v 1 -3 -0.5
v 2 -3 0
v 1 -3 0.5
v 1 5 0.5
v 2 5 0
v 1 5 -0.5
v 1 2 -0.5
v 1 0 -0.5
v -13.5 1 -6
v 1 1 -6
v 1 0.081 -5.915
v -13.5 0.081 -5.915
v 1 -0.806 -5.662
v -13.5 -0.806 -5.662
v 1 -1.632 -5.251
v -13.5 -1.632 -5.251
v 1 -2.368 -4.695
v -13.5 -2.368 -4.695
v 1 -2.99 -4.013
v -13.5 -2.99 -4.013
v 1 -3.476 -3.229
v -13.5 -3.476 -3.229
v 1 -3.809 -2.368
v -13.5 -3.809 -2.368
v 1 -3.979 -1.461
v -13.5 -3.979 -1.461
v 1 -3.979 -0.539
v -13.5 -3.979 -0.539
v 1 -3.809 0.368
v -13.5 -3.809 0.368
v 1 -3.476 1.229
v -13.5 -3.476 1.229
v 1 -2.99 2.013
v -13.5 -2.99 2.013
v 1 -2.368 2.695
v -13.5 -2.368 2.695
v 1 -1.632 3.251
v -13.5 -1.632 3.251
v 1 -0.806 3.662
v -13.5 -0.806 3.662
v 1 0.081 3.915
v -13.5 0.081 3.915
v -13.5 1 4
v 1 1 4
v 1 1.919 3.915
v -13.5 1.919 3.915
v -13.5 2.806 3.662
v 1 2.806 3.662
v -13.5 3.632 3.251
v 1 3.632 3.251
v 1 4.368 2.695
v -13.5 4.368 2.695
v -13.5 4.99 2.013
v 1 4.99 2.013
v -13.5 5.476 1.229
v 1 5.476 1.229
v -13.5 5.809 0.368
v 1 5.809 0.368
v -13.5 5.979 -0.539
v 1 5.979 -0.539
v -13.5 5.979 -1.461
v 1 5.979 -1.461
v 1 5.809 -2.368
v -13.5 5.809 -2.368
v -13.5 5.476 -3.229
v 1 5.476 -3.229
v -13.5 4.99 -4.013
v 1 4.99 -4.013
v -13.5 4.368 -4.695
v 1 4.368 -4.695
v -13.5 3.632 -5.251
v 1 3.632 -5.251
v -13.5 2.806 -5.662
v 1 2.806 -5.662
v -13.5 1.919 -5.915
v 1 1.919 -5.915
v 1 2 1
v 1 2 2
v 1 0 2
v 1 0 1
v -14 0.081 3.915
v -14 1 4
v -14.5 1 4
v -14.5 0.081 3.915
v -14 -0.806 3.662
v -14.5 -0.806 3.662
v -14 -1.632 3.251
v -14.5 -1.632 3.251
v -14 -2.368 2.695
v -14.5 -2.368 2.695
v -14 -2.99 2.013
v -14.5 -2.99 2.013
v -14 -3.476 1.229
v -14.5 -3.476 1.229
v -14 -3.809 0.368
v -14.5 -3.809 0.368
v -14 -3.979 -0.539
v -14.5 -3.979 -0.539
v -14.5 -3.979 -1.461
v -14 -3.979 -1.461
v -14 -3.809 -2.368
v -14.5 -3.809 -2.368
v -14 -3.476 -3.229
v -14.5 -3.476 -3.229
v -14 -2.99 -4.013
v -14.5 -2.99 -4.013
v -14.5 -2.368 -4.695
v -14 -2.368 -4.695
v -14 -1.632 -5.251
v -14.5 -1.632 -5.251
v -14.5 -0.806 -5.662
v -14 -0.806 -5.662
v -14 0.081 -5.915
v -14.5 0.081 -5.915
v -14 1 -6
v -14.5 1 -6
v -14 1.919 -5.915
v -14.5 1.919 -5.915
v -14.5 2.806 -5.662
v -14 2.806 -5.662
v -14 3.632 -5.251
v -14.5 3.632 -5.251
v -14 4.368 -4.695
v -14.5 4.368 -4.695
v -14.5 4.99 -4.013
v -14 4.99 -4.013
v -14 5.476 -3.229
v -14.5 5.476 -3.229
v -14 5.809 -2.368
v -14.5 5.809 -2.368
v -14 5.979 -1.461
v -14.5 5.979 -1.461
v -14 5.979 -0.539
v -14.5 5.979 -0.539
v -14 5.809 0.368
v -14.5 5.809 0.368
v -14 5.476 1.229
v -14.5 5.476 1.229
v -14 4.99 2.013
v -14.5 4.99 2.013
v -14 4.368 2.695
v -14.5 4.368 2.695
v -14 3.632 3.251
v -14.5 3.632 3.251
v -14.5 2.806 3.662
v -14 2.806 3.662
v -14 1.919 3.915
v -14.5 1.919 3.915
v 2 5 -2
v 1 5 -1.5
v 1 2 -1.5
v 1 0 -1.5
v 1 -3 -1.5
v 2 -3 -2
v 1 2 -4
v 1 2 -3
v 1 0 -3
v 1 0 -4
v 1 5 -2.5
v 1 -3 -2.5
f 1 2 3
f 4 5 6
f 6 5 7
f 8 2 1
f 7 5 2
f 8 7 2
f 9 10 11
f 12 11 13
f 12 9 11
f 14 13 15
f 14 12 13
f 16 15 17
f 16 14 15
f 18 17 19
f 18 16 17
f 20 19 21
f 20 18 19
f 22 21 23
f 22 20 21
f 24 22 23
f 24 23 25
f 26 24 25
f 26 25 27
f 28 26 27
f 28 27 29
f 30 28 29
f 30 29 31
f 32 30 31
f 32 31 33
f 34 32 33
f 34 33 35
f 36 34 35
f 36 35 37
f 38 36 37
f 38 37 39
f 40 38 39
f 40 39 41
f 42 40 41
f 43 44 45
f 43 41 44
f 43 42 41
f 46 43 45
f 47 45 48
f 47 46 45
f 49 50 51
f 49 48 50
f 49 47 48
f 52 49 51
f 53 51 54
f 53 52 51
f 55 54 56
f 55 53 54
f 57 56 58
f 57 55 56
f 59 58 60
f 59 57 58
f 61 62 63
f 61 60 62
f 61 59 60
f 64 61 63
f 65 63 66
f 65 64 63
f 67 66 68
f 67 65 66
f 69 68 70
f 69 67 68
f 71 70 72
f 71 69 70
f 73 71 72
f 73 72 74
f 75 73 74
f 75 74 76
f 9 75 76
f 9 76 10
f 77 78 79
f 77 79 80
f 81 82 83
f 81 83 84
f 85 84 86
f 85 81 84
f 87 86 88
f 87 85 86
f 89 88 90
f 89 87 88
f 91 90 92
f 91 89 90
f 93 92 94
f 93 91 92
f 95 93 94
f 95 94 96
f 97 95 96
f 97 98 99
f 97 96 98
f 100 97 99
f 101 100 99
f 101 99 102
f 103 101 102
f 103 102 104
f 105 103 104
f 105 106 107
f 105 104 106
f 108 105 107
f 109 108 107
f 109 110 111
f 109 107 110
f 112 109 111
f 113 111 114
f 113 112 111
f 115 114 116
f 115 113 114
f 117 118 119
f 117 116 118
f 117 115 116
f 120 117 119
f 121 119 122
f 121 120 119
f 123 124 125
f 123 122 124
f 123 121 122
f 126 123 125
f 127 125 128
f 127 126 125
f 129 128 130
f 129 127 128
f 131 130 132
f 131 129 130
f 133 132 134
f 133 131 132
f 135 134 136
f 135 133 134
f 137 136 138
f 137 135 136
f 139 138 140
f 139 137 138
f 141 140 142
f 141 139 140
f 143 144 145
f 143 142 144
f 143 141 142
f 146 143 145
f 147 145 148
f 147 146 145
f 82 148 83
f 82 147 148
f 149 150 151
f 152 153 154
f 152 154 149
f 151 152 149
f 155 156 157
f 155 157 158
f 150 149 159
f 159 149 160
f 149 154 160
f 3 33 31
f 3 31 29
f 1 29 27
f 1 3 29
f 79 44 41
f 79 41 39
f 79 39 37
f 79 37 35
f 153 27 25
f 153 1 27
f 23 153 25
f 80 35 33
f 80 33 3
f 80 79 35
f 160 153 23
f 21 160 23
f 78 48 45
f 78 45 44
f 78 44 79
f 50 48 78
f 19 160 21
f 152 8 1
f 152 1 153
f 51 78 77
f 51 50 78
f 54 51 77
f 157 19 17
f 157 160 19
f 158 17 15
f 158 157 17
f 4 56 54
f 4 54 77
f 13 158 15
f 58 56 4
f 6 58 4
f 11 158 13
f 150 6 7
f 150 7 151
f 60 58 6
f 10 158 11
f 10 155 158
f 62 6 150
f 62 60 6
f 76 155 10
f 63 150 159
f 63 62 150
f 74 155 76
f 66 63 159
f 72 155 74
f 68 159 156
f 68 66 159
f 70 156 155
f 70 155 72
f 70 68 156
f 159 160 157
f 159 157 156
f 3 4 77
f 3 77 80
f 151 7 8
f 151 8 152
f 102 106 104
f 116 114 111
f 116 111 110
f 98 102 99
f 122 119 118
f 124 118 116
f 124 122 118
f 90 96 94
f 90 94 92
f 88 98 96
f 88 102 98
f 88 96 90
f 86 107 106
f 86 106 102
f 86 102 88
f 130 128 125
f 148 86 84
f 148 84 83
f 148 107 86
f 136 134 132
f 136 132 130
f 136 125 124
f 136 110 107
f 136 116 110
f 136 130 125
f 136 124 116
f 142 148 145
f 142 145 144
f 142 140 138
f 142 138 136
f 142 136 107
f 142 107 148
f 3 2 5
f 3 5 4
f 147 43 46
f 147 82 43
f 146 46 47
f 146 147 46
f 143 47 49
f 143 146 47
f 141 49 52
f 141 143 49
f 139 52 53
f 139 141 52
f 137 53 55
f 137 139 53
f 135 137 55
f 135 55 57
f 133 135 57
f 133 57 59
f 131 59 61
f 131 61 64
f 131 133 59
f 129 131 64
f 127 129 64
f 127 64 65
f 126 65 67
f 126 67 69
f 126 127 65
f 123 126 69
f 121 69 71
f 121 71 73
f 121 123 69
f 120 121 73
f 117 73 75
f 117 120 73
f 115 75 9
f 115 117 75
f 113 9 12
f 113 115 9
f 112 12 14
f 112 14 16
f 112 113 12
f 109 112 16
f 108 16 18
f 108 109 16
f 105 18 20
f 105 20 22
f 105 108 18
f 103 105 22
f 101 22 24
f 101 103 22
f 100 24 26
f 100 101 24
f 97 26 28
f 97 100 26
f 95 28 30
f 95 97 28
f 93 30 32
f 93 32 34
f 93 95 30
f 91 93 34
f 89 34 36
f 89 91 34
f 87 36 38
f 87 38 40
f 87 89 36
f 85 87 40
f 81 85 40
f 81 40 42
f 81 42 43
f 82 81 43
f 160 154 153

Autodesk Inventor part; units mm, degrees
ref_plane "YZ Plane" through (0, 0, 0) normal (1, 0, 0) x (0, 1, 0)
sketch "Sketch1" plane through (0, 0, 0) normal (0, 1, 0) x (-1, 0, 0)
  line L0 (0, 0) -> (20, 0)
  line L1 (20, 0) -> (20, -2)
  line L2 (20, -2) -> (0, -2)
  line L3 (0, -2) -> (0, 0)
  dimension "d0" = 20
  dimension "d1" = 2
extrude "Extrusion1" add sketch "Sketch1" along normal blind 2
sketch "Sketch2" plane through (0, 2, 0) normal (0, 1, 0) x (1, 0, 0)
  line L0 (0, 2) -> (-20, 2) projected
  line L1 (0, 2) -> (0, 4)
  line L2 (0, 4) -> (2, 4)
  line L3 (2, 4) -> (2, -2)
  line L4 (2, -2) -> (0, -2)
  line L5 (0, 0) -> (0, 2) projected
  line L6 (0, -2) -> (0, 0)
  dimension "d4" = 2
  dimension "d5" = 2
  dimension "d6" = 6
extrude "Extrusion2" add sketch "Sketch2" against normal blind 2
sketch "Sketch3" plane through (0, 2, 0) normal (0, 1, 0) x (1, 0, 0)
  line L0 (0, 0) -> (0, -2) projected
  line L1 (0, -2) -> (0, -1)
  line L2 (2, 4) -> (2, -2) projected
  line L3 (2, -2) -> (2, -0.5)
  line L4 (2, -0.5) -> (1, -0.5)
  circle A0 centre (1, -0.5) radius 0.5
  line L5 (2, 1) -> (1.5, 1)
  circle A1 centre (1, 2.5) radius 0.5
  dimension "d9" = 1.5
  dimension "d10" = 1
  dimension "d11" = 1
extrude "Extrusion3" cut sketch "Sketch3" against normal blind 2
sketch "Sketch4" plane through (0, 2, -4) normal (-1, 0, 0) x (0, 0, 1)
  line L0 (2, 0) -> (4, 0) projected
  line L1 (3, 0) -> (3, -2)
  line L2 (2, -2) -> (4, -2) projected
  circle A0 centre (3, -1) radius 1
  line L3 (2, -2) -> (2, 0) projected
  circle A1 centre (3, -1) radius 1.4142
extrude "Extrusion4" cut sketch "Sketch4" along normal blind 100 contours L0 A0 L3 | L3 A1 | L0 A1 L2 A0 | A0 L2 L3
ref_plane "Work Plane1" through (-14, 1, -1) normal (-1, 0, 0) x (0, 0, 1)
sketch "Sketch5" plane through (-14, 1, -1) normal (-1, 0, 0) x (0, 0, 1)
  circle A0 centre (0, 0) radius 5
  point P0 (1, -1)
  dimension "d17" = 10
extrude "Extrusion5" add sketch "Sketch5" along normal mid plane 1
sketch "Sketch6" plane through (-20, 1, -1) normal (-1, 0, 0) x (0, 0, 1)
  circle A0 centre (0, 0) radius 5
  point P0 (1, -1)
extrude "Extrusion6" cut sketch "Sketch6" against normal blind 5.5
sketch "Sketch7" plane through (-13.5, 1, -1) normal (1, 0, 0) x (0, 0, -1)
  arc A0 (0, 1) -> (0, -1) centre (0, 0) ccw projected
  circle A1 centre (0, 0) radius 5
  point P0 (-1, -1)
extrude "Extrusion7" add sketch "Sketch7" along normal blind 14.5
sketch "Sketch8" plane through (1, 1, -1) normal (1, 0, 0) x (0, 0, -1)
  circle A0 centre (0, 0) radius 5
  point P0 (-1, -1)
extrude "Extrusion8" cut sketch "Sketch8" along normal blind 13.5
sketch "Sketch9" plane through (1, 1, -1) normal (1, 0, 0) x (0, 0, -1)
  point P0 (-1, -1)
sketch "Sketch10" plane through (1, 1, -1) normal (1, 0, 0) x (0, 0, -1)
  point P0 (-1, -1)
sketch "Sketch11" plane through (1, 1, -1) normal (1, 0, 0) x (0, 0, -1)
  line L0 (0, 0) -> (1.5, 0)
  line L1 (0, 0) -> (-1.5, 0)
  point P0 (-1, -1)
  dimension "d26" = 1.5
  dimension "d27" = 1.5
ref_plane "Work Plane2" through (0, 1, 0) normal (0, 1, 0) x (-1, 0, 0)
sketch "Sketch12" plane through (0, 1, 0) normal (0, 1, 0) x (-1, 0, 0)
  line L0 (-1, 4) -> (-1, -6) projected
  line L1 (-1, -1) -> (-1, 0)
  line L2 (-1, -1) -> (-1, -2)
  line L3 (-1, -2) -> (-2, -2)
  line L4 (-1, 0) -> (-2, 0)
  line L5 (-1, 0) -> (-1, -0.5)
  line L6 (-1, 0) -> (-1, 0.5)
  line L7 (-1, -2) -> (-1, -1.5)
  line L8 (-1, -2) -> (-1, -2.5)
  line L9 (-2, -2) -> (-1, -2.5)
  line L10 (-1, -1.5) -> (-2, -2)
  line L11 (-2, 0) -> (-1, -0.5)
  line L12 (-2, 0) -> (-1, 0.5)
  point P0 (0, 0)
  point P1 (-1, -0.5)
  dimension "d32" = 1
  dimension "d33" = 1
  dimension "d34" = 1
  dimension "d35" = 1
  dimension "d36" = 0.5
  dimension "d37" = 0.5
  dimension "d38" = 0.5
  dimension "d39" = 0.5
extrude "Extrusion9" add sketch "Sketch12" along normal mid plane 8
properties part number "drive_shaft_v2"
